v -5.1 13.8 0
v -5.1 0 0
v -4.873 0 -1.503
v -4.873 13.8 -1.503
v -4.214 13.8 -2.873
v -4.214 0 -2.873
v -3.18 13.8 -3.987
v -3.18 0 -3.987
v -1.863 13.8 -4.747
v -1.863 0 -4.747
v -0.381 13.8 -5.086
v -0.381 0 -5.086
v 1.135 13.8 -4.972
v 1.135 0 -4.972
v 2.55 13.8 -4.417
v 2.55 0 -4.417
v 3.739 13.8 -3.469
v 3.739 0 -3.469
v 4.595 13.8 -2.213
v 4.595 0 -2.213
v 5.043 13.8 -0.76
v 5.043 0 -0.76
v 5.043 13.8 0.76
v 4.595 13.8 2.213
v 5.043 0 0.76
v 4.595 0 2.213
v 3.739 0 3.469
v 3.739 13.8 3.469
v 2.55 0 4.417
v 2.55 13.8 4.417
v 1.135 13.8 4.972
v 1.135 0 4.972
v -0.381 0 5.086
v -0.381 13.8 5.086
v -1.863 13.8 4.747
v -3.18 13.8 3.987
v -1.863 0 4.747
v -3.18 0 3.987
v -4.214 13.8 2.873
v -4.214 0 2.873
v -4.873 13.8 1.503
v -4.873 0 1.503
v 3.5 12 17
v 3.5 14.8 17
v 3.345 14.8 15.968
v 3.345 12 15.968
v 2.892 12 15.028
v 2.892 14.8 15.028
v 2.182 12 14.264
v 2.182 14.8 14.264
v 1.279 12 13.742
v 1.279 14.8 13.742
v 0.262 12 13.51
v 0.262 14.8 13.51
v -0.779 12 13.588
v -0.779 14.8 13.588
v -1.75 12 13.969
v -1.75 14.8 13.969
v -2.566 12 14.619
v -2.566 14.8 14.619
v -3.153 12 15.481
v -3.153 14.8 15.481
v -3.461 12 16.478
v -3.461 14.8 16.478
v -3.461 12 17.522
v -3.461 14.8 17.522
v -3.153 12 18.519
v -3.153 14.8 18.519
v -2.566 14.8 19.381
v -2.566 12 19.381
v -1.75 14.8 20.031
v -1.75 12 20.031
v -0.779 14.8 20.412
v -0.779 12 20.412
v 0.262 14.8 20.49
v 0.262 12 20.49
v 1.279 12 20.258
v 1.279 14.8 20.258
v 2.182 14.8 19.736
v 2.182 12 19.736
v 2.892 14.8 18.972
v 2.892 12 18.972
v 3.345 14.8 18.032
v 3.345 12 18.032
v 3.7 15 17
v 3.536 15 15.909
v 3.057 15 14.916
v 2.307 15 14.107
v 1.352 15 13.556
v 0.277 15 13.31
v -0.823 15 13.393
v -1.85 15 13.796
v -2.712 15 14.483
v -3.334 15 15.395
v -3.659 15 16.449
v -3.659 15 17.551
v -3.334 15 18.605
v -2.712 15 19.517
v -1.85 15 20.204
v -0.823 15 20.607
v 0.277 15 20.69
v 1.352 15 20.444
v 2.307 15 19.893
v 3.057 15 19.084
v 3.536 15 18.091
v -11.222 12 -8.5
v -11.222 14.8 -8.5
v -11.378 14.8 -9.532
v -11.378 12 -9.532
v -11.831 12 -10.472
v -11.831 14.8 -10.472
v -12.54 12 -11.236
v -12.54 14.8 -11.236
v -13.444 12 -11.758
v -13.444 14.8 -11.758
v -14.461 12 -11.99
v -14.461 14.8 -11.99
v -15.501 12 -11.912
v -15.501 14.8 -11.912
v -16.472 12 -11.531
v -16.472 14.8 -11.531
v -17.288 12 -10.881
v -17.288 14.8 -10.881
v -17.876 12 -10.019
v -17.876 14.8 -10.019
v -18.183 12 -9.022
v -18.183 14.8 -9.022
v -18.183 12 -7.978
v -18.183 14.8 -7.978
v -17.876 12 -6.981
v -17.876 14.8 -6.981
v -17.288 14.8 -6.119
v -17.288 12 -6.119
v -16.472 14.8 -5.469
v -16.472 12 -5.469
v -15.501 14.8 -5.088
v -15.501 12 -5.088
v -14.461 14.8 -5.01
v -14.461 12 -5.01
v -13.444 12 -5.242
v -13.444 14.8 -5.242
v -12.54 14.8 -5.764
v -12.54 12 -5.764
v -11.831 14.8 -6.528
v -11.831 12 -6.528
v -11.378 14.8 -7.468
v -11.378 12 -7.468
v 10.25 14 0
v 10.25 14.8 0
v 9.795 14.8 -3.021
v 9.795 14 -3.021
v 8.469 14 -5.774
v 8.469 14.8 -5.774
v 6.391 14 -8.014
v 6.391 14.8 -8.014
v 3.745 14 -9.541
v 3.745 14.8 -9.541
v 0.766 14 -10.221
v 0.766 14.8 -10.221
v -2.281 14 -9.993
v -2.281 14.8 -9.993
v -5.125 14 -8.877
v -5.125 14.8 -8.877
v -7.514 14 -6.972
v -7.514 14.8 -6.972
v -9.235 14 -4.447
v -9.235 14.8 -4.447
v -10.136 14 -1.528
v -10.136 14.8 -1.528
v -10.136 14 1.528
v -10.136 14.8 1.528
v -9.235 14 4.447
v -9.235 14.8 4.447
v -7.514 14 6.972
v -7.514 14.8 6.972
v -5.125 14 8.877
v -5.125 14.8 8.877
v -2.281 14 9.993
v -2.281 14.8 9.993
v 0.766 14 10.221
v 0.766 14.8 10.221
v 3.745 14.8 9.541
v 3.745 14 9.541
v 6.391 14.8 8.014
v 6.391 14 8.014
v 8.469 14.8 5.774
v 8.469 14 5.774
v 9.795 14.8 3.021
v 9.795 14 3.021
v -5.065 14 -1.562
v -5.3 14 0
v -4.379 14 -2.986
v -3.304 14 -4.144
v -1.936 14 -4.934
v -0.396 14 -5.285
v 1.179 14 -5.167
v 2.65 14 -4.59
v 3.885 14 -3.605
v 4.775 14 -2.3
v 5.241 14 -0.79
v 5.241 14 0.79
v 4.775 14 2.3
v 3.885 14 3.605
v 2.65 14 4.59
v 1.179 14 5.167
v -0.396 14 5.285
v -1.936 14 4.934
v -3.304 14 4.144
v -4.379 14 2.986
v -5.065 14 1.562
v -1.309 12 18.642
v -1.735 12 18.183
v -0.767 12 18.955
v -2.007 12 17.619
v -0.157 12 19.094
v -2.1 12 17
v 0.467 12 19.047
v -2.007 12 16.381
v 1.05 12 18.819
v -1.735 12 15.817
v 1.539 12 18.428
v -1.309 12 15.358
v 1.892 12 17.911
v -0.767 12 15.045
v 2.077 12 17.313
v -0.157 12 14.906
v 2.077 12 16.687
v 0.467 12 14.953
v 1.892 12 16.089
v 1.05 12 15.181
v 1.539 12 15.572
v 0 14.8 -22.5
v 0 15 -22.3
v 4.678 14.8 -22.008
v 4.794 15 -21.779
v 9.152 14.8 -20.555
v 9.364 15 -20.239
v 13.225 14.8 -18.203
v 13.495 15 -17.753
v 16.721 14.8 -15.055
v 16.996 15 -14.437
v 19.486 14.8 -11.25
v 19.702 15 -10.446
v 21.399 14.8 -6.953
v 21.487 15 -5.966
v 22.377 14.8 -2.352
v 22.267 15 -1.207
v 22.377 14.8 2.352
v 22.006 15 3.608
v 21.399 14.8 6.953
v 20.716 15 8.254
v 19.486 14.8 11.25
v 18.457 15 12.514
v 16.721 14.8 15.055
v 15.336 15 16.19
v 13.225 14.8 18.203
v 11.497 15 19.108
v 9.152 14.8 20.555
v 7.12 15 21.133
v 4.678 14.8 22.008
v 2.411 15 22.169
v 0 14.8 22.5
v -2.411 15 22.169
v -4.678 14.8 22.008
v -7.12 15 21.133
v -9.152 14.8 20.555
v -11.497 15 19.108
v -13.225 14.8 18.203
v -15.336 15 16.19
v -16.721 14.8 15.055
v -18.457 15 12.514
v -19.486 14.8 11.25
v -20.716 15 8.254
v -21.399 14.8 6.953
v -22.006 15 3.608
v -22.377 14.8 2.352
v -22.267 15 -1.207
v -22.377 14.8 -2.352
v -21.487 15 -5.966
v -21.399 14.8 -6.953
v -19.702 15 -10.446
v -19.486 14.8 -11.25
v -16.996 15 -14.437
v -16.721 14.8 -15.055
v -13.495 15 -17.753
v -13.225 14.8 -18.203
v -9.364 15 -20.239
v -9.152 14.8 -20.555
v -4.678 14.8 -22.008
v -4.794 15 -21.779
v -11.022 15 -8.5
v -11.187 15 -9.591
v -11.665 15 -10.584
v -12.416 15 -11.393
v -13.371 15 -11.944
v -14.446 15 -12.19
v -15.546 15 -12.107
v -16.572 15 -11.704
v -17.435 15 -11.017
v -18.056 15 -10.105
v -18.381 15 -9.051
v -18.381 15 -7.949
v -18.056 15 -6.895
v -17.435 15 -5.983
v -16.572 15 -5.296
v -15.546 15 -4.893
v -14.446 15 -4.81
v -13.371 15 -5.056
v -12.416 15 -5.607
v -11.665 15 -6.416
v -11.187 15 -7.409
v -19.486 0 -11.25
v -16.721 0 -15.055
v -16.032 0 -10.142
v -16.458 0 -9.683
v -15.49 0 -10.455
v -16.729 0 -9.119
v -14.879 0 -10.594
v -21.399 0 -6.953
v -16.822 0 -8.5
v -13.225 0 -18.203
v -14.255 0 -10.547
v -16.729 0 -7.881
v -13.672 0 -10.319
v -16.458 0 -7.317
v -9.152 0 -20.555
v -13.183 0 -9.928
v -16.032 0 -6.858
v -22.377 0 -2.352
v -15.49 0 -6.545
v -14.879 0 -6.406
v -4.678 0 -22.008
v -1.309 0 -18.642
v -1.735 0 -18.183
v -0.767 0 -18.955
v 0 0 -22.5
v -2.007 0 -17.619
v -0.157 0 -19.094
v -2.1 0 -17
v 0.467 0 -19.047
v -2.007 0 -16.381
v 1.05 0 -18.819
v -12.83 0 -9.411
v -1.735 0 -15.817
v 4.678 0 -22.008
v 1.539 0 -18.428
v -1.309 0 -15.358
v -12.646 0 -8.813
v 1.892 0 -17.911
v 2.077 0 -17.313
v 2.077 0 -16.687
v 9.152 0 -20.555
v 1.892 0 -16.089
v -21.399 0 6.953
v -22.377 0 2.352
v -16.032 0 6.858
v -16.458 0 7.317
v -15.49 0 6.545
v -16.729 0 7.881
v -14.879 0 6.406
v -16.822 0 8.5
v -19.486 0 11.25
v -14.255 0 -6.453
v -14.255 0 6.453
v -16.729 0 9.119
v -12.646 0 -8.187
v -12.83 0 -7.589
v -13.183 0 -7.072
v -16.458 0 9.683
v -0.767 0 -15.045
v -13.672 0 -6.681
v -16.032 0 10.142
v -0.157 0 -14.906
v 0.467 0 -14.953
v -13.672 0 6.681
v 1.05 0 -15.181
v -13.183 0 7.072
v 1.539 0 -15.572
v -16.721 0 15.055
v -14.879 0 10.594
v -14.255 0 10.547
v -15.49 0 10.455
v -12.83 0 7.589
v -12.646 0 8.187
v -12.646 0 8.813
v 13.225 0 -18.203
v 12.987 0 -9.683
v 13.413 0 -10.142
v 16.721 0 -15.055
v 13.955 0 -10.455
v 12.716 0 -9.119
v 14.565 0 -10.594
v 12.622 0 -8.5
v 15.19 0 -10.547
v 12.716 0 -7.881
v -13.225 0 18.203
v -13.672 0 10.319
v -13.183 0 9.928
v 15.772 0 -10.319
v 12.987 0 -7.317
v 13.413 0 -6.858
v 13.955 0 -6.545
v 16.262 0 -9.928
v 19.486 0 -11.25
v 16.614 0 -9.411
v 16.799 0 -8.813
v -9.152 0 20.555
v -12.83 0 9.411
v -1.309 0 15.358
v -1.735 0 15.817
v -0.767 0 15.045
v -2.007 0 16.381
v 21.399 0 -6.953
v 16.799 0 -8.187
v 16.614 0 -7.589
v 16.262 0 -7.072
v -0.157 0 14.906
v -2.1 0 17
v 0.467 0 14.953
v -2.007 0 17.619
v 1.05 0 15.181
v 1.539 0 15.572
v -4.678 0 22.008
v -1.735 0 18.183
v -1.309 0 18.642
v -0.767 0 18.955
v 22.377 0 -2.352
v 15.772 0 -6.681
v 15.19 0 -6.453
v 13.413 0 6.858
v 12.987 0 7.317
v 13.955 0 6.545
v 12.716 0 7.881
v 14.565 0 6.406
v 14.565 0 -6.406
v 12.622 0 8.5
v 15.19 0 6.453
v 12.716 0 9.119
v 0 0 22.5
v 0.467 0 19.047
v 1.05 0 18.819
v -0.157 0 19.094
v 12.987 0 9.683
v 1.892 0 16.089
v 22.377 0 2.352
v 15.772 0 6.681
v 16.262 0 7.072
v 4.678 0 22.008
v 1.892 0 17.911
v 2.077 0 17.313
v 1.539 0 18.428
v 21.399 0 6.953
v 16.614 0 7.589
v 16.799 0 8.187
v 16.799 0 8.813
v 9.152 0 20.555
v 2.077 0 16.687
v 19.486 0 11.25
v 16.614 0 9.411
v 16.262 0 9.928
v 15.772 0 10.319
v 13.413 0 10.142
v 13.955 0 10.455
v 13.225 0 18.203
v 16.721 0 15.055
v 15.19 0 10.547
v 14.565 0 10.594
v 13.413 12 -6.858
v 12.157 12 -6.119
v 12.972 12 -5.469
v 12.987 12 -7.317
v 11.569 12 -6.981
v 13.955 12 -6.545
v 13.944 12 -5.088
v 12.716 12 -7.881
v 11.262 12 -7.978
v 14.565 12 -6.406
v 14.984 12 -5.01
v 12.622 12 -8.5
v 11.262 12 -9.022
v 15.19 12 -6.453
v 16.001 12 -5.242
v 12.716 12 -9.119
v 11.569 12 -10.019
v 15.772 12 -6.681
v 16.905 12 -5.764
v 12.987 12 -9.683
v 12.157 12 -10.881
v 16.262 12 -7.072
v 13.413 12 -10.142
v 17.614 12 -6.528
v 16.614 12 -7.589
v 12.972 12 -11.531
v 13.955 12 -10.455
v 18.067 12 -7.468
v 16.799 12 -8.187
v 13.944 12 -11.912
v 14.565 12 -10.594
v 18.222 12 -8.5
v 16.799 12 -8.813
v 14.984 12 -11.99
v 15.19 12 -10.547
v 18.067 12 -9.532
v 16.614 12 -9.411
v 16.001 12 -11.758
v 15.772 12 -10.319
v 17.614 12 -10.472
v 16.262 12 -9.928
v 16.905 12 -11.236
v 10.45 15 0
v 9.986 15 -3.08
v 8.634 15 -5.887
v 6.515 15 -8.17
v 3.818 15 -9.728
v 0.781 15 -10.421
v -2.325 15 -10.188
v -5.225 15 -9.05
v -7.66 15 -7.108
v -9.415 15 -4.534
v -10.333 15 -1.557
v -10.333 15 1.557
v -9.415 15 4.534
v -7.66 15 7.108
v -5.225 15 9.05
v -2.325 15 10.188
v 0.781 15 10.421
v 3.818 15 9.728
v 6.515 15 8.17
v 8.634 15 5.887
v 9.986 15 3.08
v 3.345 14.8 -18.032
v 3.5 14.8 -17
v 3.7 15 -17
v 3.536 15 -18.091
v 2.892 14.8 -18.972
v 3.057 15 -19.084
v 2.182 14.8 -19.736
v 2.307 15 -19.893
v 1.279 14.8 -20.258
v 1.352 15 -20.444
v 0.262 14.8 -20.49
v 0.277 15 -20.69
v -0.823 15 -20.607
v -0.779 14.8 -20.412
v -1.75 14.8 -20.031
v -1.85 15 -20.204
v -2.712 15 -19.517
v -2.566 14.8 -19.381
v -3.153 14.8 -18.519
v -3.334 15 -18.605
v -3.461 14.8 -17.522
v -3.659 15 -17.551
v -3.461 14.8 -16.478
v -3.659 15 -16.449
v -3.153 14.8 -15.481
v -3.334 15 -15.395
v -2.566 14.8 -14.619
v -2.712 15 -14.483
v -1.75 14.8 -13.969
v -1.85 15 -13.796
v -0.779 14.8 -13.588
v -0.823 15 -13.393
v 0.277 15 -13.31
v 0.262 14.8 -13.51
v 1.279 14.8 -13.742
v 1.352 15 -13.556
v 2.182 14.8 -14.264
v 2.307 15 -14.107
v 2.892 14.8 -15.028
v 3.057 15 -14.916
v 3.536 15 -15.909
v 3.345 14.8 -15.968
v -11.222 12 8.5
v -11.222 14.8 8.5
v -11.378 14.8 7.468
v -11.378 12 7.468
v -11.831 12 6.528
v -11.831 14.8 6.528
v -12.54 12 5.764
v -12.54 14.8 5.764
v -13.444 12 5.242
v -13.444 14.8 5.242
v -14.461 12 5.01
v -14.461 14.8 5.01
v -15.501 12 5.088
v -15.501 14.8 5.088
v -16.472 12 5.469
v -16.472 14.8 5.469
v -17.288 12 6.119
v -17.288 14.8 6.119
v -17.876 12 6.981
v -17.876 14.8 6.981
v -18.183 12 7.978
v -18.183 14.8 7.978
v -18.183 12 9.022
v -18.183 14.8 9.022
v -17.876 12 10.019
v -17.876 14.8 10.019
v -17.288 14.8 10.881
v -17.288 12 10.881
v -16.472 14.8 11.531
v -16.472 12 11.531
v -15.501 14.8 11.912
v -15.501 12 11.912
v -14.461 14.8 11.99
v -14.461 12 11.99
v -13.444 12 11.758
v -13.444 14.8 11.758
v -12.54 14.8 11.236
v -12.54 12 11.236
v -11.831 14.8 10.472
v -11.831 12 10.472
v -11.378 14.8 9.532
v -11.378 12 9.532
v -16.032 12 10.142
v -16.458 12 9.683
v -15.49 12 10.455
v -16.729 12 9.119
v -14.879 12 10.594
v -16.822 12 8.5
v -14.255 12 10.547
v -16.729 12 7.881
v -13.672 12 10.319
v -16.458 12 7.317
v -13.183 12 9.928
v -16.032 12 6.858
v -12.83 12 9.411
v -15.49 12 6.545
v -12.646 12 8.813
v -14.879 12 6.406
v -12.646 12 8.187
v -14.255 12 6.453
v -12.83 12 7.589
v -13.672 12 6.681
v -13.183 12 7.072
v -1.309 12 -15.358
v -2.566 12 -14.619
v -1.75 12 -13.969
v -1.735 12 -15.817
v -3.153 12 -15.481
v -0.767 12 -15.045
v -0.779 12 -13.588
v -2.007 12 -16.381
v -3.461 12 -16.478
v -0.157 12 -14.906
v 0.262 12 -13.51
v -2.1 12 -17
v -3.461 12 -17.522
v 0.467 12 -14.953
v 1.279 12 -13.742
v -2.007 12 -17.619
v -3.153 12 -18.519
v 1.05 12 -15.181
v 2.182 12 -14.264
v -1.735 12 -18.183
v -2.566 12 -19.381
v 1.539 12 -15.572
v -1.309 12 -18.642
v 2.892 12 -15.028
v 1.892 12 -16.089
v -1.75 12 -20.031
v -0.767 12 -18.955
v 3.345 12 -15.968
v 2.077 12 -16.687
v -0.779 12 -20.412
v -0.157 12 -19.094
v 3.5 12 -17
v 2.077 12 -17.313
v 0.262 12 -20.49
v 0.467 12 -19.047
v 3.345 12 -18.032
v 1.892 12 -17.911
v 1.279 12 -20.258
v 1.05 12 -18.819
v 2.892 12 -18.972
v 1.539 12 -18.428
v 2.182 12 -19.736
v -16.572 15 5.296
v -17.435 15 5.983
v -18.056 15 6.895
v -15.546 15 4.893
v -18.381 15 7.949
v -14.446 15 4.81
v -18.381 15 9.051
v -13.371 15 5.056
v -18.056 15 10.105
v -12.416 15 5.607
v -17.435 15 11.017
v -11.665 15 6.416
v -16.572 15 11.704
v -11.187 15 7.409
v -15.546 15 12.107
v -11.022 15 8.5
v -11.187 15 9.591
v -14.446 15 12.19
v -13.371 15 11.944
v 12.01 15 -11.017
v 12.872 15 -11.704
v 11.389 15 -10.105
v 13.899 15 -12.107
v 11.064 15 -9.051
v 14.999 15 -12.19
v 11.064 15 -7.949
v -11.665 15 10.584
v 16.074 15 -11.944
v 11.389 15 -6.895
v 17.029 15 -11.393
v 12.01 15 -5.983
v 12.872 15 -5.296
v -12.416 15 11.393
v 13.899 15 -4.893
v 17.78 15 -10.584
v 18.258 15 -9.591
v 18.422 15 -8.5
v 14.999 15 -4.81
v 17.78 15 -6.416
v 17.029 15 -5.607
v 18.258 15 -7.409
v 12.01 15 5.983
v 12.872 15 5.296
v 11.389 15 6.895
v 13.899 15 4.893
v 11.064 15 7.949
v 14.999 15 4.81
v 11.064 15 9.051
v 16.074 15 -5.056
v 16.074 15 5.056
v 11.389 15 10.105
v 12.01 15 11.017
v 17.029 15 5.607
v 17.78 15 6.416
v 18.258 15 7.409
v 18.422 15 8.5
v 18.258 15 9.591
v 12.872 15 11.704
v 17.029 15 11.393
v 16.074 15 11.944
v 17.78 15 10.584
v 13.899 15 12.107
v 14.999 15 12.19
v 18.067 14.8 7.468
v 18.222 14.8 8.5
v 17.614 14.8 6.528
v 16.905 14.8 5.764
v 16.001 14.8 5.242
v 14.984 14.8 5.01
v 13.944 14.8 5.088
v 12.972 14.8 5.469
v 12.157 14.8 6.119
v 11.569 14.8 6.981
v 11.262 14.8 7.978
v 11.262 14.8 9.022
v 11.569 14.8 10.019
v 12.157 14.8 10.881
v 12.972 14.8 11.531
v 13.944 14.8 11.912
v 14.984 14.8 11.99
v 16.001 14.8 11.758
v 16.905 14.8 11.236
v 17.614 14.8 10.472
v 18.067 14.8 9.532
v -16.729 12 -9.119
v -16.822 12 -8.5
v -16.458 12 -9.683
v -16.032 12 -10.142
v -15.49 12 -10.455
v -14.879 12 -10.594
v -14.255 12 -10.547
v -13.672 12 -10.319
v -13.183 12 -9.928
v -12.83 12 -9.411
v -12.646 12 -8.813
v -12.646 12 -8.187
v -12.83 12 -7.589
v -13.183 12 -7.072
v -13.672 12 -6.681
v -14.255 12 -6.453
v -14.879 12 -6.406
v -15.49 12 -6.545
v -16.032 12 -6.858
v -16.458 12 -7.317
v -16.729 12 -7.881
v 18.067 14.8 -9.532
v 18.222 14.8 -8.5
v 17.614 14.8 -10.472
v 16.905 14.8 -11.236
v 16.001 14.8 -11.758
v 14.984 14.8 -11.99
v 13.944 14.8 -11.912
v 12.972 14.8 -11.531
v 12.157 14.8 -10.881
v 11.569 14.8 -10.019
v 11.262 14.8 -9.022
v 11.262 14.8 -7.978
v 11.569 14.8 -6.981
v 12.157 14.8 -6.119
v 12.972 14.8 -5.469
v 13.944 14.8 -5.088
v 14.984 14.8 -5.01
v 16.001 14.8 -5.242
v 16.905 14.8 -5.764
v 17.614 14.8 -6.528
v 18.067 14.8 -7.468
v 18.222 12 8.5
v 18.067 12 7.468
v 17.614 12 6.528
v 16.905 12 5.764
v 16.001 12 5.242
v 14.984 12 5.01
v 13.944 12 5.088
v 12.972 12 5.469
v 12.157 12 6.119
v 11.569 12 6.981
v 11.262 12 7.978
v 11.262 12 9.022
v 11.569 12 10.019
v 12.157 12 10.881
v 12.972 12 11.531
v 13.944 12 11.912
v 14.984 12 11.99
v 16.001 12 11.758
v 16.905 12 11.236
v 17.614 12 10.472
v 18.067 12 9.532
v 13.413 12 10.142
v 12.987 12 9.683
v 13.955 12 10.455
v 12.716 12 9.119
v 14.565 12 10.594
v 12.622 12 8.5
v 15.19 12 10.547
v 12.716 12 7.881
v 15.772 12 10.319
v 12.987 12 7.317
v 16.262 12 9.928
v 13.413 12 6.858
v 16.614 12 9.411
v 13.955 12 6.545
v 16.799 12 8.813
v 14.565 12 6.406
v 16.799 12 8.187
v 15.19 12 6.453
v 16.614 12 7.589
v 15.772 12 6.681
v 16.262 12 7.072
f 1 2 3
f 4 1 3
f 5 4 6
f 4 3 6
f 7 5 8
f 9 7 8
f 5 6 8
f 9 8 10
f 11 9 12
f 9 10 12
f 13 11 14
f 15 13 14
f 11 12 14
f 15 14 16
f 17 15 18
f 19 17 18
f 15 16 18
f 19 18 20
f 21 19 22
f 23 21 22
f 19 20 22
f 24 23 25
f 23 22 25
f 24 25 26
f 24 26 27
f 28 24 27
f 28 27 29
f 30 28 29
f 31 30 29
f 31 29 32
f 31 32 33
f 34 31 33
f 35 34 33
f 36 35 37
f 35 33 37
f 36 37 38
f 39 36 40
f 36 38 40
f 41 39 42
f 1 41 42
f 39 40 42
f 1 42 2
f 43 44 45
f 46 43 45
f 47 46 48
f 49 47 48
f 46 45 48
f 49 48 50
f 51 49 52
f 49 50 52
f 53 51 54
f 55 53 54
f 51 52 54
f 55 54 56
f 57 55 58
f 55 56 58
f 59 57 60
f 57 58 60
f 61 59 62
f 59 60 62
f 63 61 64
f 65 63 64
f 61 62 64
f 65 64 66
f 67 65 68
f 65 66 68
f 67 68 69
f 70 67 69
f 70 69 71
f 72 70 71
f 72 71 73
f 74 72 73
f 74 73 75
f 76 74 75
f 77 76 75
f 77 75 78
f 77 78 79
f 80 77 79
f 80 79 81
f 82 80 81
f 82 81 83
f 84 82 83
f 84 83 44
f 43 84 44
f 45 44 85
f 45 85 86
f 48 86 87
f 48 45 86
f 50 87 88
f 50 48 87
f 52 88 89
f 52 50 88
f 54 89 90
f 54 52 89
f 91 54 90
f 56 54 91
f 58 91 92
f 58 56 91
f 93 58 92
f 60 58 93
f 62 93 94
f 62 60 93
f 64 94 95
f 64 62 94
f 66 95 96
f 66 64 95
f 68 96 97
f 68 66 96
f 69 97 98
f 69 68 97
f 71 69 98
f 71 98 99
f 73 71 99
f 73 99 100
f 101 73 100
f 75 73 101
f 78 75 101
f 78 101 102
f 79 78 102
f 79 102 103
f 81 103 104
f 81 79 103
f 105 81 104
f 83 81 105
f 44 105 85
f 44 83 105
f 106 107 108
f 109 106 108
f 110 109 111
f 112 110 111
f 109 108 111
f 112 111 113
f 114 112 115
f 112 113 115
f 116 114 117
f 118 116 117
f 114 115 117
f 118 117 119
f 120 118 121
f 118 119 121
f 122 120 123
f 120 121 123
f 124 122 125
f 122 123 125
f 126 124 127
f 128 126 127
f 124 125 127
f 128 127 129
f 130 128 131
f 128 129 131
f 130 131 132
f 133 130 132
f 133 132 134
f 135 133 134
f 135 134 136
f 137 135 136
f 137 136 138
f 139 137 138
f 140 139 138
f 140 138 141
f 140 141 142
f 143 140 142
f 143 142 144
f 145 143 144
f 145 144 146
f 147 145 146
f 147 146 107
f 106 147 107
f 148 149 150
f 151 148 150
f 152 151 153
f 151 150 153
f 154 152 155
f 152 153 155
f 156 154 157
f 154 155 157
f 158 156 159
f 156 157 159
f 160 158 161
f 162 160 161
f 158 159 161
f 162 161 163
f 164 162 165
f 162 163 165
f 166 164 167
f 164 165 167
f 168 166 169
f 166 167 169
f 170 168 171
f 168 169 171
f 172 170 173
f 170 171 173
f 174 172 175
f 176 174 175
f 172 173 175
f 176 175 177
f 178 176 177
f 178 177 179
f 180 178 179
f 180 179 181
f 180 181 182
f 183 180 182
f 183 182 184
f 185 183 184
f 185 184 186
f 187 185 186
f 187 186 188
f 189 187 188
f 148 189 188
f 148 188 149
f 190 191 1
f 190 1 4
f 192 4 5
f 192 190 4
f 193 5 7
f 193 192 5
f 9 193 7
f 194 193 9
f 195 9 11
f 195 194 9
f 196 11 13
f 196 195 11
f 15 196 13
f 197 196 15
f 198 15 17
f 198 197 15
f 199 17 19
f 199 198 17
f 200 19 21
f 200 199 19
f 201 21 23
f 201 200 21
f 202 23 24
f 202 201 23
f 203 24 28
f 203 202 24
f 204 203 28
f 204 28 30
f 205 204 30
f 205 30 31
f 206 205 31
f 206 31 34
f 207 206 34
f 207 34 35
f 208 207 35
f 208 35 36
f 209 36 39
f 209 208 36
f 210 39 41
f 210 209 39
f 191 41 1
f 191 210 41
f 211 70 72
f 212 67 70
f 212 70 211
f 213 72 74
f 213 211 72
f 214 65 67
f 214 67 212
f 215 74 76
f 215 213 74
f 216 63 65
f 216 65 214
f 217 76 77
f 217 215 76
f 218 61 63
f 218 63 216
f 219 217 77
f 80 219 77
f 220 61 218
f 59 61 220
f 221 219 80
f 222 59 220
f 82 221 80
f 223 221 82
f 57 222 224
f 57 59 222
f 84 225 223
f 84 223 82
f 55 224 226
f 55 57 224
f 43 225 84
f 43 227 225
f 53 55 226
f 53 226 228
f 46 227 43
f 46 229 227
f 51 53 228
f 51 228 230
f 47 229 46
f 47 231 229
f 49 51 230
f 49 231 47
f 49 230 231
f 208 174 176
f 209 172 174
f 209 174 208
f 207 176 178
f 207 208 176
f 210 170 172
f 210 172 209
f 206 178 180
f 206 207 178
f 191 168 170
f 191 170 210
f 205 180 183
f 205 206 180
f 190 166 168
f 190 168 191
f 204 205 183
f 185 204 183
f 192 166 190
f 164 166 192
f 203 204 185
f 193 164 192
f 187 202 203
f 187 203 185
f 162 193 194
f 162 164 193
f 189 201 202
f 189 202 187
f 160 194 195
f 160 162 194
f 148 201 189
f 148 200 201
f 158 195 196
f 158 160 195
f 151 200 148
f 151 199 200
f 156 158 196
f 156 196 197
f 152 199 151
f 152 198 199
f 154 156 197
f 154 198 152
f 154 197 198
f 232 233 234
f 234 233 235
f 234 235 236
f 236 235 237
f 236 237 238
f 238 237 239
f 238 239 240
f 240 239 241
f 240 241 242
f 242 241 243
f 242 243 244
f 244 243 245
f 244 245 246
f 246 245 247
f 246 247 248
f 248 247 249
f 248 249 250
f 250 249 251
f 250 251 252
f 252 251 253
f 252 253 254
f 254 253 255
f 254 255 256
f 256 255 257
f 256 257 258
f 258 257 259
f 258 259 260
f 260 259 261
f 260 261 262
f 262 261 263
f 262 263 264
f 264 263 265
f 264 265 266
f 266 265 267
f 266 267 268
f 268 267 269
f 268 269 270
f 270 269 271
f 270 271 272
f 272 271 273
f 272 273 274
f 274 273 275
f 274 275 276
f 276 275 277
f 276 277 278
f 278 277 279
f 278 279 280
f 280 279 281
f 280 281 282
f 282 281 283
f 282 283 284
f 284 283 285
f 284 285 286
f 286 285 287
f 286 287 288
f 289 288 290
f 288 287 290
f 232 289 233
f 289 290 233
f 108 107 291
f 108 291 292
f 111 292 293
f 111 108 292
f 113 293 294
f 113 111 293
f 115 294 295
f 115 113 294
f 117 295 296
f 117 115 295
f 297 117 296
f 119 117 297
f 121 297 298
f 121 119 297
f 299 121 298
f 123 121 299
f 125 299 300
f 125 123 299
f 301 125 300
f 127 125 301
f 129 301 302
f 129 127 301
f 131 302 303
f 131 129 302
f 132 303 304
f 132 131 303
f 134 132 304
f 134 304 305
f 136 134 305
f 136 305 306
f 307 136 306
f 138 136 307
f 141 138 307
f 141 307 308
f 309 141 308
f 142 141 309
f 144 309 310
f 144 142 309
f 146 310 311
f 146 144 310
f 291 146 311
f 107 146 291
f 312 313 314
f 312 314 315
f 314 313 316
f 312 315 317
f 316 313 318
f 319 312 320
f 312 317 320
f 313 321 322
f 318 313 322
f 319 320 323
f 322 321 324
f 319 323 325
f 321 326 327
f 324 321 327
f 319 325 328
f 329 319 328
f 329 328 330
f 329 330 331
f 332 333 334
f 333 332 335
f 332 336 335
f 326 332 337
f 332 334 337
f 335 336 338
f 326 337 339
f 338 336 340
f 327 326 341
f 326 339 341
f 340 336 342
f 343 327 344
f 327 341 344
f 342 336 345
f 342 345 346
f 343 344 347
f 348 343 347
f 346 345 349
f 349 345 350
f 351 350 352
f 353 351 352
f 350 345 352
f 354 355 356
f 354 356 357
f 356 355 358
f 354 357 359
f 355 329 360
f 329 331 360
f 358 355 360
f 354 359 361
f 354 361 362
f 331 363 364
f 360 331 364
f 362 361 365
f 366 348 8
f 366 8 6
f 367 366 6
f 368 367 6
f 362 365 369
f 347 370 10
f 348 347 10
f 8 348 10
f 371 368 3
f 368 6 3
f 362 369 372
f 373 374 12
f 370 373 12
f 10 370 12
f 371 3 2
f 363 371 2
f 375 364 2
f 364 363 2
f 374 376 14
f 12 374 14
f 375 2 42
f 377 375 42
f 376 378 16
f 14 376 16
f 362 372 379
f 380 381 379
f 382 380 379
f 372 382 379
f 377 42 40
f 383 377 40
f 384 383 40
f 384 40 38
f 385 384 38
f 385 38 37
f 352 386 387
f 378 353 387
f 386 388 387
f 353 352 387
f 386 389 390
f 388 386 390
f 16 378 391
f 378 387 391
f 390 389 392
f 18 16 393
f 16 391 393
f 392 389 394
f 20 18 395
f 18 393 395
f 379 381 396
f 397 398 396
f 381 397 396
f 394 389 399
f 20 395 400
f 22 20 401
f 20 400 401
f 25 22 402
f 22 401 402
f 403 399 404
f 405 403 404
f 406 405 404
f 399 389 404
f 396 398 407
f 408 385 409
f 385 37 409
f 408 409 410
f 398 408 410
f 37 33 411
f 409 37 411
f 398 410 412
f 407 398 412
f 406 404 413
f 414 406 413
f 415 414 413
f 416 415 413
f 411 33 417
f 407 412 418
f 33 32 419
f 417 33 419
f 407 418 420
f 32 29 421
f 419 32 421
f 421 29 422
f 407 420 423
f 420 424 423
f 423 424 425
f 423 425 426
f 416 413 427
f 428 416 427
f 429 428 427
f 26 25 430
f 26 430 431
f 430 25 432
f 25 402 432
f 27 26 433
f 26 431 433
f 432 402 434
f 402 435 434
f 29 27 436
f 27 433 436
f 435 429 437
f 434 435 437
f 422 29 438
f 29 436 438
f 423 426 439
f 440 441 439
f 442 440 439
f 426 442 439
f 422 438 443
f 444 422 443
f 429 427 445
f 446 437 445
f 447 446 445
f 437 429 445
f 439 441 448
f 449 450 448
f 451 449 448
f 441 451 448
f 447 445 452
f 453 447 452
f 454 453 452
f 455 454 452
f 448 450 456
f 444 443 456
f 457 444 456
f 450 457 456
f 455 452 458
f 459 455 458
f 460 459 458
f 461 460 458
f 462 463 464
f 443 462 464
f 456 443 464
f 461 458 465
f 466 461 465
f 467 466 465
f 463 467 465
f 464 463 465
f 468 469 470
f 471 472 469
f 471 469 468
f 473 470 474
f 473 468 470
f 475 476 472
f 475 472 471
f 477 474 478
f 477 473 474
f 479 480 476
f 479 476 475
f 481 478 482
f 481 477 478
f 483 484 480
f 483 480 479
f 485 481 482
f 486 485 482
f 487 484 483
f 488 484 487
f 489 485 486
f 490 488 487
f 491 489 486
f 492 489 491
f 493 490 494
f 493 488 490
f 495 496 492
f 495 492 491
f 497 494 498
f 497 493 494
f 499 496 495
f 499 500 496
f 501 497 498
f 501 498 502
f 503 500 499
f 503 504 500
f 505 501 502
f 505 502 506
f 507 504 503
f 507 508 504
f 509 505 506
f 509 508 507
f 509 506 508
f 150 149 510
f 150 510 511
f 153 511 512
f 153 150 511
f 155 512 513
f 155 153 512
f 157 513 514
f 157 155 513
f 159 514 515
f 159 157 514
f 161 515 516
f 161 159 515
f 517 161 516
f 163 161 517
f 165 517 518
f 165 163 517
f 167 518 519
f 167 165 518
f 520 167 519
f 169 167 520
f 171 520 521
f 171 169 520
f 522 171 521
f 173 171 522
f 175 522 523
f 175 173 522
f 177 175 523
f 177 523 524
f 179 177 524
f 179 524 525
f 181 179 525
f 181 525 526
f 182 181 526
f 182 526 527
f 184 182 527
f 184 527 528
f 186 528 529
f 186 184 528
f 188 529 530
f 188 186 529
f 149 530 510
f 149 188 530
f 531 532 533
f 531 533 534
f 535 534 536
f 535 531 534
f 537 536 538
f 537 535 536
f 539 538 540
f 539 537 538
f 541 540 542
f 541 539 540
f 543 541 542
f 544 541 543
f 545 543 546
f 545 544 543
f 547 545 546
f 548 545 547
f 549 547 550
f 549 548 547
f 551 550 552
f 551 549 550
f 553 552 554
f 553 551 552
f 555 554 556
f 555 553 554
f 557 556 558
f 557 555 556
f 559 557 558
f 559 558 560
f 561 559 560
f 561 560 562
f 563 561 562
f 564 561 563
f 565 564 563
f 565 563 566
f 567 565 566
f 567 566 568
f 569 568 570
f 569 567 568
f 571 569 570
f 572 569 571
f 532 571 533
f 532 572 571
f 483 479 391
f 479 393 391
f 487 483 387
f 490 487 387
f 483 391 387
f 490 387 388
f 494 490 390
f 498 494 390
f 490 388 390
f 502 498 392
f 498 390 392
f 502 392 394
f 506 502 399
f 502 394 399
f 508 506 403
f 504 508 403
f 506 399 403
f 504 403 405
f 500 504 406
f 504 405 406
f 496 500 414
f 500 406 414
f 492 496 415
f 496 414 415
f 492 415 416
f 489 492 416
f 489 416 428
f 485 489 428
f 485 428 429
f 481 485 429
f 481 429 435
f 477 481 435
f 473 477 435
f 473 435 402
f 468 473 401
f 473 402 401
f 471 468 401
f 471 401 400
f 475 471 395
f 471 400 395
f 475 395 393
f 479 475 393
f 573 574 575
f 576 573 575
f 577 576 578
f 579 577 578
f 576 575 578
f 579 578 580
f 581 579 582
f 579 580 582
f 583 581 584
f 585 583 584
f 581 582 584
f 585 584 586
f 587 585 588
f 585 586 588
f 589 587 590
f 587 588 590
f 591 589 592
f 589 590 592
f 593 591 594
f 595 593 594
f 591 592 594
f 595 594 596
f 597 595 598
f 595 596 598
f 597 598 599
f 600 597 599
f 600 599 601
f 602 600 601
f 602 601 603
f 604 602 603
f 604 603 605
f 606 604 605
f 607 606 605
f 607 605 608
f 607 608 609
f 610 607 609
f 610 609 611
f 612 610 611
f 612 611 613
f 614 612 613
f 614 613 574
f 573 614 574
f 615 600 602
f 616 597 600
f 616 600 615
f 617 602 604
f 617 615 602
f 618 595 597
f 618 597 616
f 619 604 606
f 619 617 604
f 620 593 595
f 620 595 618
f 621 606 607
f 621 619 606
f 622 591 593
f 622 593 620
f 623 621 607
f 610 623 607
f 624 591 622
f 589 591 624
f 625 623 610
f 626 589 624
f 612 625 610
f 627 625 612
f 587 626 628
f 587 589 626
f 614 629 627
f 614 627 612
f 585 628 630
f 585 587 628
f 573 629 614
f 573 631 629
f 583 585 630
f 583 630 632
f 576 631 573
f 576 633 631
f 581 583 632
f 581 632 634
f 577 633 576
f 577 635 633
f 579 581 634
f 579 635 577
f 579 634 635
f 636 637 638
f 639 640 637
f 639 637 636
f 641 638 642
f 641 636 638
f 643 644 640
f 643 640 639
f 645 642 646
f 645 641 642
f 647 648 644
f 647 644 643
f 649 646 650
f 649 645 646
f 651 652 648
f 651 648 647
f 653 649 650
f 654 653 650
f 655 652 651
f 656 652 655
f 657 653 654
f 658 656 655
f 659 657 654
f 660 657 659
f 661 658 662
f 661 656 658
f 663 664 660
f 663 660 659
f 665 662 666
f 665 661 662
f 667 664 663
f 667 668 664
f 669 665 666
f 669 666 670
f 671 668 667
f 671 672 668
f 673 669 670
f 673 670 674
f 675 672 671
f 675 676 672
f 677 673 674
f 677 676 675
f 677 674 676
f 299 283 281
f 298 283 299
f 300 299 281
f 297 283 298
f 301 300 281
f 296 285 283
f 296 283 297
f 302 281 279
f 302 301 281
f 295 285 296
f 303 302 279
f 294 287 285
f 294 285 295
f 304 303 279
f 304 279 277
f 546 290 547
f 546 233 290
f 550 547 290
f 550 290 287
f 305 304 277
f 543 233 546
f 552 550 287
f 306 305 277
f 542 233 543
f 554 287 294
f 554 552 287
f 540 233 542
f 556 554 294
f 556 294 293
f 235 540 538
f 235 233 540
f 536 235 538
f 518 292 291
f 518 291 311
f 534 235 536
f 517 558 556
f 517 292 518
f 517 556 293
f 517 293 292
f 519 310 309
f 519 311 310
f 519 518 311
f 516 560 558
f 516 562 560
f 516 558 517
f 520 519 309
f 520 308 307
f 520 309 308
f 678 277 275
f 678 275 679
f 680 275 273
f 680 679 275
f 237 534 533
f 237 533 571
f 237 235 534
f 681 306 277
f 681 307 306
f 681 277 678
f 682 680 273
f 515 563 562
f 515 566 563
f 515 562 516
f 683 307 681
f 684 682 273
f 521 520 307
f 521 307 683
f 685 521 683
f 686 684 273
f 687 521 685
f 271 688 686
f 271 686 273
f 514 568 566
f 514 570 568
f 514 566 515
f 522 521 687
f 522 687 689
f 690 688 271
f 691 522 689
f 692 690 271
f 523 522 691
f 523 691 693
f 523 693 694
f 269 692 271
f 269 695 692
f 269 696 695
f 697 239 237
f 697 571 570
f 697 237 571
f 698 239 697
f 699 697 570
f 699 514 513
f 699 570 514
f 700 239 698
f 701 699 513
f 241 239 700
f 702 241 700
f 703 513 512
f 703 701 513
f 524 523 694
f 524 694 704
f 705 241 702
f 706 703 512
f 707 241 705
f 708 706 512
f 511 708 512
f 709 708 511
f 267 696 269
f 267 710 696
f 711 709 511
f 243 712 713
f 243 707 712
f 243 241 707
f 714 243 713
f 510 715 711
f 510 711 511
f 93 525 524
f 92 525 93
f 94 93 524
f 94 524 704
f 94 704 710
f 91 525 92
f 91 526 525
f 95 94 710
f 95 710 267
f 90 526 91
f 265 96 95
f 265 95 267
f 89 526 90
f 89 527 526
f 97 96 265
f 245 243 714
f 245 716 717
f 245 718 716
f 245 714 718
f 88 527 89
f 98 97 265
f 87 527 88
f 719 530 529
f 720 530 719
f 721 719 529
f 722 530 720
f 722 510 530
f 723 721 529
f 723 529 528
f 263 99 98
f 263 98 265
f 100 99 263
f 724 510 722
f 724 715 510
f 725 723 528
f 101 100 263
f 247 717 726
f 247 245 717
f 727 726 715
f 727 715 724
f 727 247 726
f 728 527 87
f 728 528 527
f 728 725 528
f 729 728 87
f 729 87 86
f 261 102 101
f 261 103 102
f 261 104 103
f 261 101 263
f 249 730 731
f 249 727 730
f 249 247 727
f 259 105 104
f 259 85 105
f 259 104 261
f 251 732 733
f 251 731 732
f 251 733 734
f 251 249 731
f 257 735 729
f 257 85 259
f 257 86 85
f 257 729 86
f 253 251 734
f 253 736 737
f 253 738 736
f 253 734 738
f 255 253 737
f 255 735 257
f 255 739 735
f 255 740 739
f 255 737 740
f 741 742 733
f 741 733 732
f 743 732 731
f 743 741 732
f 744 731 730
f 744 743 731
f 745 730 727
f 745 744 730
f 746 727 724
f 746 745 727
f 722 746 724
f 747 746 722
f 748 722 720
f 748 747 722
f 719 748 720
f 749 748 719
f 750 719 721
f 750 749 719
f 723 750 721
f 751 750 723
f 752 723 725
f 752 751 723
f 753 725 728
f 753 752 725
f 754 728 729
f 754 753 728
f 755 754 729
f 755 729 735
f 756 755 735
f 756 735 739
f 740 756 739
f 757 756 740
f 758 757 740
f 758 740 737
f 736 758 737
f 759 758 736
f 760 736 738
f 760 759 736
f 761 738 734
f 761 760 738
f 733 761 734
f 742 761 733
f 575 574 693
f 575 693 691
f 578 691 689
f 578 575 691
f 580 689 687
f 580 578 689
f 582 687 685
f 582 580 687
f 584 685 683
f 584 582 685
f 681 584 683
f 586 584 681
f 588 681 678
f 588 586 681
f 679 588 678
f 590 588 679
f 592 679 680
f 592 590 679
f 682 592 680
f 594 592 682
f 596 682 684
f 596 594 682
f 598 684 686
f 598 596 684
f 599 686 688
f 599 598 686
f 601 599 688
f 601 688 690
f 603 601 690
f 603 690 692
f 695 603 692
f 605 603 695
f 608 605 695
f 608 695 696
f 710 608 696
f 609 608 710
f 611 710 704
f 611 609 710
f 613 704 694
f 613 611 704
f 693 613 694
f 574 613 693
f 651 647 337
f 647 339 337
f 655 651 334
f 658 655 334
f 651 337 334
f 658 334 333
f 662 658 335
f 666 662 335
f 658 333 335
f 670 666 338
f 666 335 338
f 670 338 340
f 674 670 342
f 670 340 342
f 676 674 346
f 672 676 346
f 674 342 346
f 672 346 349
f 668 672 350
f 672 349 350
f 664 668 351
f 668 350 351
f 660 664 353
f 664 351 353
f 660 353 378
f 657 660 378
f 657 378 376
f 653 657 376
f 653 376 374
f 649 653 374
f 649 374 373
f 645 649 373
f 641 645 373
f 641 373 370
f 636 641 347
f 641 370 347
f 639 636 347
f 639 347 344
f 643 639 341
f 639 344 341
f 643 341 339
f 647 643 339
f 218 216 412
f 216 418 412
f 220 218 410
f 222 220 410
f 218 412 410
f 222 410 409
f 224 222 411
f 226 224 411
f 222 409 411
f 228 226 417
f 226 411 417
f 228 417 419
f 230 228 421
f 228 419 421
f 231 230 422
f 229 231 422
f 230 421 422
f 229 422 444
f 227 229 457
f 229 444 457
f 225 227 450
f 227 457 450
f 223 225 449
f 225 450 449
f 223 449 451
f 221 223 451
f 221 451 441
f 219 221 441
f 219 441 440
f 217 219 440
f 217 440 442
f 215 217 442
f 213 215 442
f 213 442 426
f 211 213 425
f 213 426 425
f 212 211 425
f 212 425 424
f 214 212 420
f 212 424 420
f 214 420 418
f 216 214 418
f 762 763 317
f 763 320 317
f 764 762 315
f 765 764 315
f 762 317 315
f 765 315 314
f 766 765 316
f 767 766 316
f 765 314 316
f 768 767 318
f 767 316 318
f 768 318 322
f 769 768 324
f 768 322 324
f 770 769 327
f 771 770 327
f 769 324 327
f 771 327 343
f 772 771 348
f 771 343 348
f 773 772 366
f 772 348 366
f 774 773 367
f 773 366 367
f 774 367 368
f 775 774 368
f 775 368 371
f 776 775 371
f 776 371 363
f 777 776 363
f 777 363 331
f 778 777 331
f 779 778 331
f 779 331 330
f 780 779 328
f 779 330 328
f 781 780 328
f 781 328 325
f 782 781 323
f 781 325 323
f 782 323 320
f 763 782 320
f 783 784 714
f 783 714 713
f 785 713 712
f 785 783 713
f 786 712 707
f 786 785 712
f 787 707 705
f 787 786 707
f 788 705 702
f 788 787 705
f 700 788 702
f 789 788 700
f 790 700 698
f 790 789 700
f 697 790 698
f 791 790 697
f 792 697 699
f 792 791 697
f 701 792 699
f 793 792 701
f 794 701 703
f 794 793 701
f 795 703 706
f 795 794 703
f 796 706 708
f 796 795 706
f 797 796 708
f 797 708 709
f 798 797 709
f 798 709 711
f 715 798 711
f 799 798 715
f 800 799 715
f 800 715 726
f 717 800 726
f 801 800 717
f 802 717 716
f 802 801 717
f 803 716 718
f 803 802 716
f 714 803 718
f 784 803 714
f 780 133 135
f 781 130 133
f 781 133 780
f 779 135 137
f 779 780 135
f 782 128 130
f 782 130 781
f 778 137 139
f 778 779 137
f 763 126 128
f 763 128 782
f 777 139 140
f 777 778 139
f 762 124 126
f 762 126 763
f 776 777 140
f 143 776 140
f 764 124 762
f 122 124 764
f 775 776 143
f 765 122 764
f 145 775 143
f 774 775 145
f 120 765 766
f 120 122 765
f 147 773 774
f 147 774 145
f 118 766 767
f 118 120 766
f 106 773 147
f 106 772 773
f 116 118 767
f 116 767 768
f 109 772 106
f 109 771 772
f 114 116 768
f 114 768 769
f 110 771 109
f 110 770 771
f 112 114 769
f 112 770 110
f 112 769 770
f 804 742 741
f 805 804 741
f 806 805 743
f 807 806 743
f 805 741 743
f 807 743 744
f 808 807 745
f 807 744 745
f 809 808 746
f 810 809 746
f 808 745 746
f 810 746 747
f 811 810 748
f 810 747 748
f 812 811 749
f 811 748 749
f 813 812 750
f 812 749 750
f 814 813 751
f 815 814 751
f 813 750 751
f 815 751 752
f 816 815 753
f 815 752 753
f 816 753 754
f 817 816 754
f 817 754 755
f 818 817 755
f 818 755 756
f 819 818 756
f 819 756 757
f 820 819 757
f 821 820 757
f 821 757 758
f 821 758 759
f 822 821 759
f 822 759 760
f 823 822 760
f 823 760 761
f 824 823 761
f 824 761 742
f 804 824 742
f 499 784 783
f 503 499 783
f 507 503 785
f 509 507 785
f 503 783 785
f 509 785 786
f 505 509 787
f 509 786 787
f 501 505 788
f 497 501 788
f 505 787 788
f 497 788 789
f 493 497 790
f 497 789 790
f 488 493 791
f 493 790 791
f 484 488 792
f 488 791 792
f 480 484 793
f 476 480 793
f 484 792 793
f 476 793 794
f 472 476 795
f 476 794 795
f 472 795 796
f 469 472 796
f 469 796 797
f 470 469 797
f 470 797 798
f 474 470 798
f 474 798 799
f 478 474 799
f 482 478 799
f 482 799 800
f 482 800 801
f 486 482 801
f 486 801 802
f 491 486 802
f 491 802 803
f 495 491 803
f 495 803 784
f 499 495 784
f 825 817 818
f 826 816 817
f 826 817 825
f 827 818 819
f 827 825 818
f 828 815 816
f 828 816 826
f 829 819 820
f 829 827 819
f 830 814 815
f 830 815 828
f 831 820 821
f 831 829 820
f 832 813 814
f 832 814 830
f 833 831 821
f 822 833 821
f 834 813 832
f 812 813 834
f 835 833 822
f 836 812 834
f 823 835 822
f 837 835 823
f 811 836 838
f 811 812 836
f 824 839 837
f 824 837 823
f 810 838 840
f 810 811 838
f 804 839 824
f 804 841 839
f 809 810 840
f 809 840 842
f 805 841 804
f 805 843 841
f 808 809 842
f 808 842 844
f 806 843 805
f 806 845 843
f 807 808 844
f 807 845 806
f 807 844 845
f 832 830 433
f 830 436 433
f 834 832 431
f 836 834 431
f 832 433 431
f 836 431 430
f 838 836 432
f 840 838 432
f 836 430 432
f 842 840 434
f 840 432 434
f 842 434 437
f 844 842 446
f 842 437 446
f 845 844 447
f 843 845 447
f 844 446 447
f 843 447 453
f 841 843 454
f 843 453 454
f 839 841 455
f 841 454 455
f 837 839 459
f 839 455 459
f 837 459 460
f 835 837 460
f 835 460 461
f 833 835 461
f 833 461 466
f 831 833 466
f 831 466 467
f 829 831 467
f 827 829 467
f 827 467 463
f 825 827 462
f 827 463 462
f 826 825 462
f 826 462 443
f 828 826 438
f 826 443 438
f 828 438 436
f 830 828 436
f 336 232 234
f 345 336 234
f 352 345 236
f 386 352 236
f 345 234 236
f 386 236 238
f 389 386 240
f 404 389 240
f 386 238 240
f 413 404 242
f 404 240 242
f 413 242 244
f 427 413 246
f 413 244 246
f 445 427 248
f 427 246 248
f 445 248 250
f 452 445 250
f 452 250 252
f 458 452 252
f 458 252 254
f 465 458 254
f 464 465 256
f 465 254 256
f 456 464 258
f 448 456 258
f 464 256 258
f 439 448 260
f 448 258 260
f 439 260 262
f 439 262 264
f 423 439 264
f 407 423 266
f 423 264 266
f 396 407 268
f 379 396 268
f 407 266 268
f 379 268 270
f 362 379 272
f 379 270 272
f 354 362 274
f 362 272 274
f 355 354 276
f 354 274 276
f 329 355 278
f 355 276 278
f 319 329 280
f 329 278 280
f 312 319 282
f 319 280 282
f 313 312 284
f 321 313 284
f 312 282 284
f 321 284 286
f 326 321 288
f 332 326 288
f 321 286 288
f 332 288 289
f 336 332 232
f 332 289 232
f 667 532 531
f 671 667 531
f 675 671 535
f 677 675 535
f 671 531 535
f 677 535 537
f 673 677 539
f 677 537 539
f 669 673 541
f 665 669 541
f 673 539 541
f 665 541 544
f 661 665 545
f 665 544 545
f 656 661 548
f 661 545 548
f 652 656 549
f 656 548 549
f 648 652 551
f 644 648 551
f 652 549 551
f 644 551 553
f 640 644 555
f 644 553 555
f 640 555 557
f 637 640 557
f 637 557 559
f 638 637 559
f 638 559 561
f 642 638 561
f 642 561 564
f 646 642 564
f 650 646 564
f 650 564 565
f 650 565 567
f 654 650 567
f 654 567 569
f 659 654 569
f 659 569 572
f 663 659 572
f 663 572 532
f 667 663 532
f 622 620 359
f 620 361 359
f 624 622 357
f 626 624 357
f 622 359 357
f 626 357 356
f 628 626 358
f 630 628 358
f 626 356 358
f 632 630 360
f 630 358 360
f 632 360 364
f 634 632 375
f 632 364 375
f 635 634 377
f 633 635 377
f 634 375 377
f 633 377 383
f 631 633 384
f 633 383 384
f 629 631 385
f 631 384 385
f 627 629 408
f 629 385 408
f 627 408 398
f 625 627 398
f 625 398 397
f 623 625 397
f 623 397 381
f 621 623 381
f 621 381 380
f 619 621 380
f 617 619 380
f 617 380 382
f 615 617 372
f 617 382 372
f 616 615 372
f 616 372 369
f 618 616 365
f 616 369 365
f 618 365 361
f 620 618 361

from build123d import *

# Parameters (mm, degrees)
SKETCH_1_W                     = 22.5
SKETCH_1_H                     = 15
HOLE_WIZARD_M3_5_1_D           = 4.2
HOLE_WIZARD_M3_5_1_CBORE_D     = 7
HOLE_WIZARD_M3_5_1_CBORE_DEPTH = 3
HOLE_WIZARD_1_D                = 10.2
HOLE_WIZARD_1_CBORE_D          = 20.5
HOLE_WIZARD_1_CBORE_DEPTH      = 1
CHAMFER_1_SIZE                 = 0.2


with BuildPart() as part:
    # 草图1 → 旋转1 (revolve)
    with BuildSketch(Plane.XY, mode=Mode.PRIVATE) as revolve_1_sk:
        with Locations((11.25, 7.5)):
            Rectangle(SKETCH_1_W, SKETCH_1_H)
    revolve(revolve_1_sk.sketch.rotate(Axis((0, 15, 0), (0, -1, 0)), 270), axis=Axis((0, 15, 0), (0, -1, 0)))

    # M3.5 六角头机械螺钉的柱形沉头孔1 (through all)
    with Locations(Plane(origin=(0, 15, 0), x_dir=(1, 0, 0), z_dir=(0, 1, 0))):
        with Locations((14.722431864, 8.5), (14.722431864, -8.5), (0, -17), (-14.722431864, -8.5), (-14.722431864, 8.5), (0, 17)):
            CounterBoreHole(HOLE_WIZARD_M3_5_1_D / 2, HOLE_WIZARD_M3_5_1_CBORE_D / 2, HOLE_WIZARD_M3_5_1_CBORE_DEPTH)

    # 孔1 (through all)
    with Locations(Plane(origin=(0, 15, 0), x_dir=(1, 0, 0), z_dir=(0, 1, 0))):
        with Locations((0, 0)):
            CounterBoreHole(HOLE_WIZARD_1_D / 2, HOLE_WIZARD_1_CBORE_D / 2, HOLE_WIZARD_1_CBORE_DEPTH)

    # 倒角1
    chamfer_1_edges = [part.edges().sort_by_distance(p)[0] for p in [
        (-3.5, 15, -17),
        (-18.222431864, 15, -8.5),
        (-18.222431864, 15, 8.5),
        (-3.5, 15, 17),
        (11.222431864, 15, 8.5),
        (11.222431864, 15, -8.5),
        (0, 15, 22.5),
        (-10.25, 15, 0),
        (5.1, 14, 0),
    ]]
    chamfer(chamfer_1_edges, length=CHAMFER_1_SIZE)


solid = part.part
